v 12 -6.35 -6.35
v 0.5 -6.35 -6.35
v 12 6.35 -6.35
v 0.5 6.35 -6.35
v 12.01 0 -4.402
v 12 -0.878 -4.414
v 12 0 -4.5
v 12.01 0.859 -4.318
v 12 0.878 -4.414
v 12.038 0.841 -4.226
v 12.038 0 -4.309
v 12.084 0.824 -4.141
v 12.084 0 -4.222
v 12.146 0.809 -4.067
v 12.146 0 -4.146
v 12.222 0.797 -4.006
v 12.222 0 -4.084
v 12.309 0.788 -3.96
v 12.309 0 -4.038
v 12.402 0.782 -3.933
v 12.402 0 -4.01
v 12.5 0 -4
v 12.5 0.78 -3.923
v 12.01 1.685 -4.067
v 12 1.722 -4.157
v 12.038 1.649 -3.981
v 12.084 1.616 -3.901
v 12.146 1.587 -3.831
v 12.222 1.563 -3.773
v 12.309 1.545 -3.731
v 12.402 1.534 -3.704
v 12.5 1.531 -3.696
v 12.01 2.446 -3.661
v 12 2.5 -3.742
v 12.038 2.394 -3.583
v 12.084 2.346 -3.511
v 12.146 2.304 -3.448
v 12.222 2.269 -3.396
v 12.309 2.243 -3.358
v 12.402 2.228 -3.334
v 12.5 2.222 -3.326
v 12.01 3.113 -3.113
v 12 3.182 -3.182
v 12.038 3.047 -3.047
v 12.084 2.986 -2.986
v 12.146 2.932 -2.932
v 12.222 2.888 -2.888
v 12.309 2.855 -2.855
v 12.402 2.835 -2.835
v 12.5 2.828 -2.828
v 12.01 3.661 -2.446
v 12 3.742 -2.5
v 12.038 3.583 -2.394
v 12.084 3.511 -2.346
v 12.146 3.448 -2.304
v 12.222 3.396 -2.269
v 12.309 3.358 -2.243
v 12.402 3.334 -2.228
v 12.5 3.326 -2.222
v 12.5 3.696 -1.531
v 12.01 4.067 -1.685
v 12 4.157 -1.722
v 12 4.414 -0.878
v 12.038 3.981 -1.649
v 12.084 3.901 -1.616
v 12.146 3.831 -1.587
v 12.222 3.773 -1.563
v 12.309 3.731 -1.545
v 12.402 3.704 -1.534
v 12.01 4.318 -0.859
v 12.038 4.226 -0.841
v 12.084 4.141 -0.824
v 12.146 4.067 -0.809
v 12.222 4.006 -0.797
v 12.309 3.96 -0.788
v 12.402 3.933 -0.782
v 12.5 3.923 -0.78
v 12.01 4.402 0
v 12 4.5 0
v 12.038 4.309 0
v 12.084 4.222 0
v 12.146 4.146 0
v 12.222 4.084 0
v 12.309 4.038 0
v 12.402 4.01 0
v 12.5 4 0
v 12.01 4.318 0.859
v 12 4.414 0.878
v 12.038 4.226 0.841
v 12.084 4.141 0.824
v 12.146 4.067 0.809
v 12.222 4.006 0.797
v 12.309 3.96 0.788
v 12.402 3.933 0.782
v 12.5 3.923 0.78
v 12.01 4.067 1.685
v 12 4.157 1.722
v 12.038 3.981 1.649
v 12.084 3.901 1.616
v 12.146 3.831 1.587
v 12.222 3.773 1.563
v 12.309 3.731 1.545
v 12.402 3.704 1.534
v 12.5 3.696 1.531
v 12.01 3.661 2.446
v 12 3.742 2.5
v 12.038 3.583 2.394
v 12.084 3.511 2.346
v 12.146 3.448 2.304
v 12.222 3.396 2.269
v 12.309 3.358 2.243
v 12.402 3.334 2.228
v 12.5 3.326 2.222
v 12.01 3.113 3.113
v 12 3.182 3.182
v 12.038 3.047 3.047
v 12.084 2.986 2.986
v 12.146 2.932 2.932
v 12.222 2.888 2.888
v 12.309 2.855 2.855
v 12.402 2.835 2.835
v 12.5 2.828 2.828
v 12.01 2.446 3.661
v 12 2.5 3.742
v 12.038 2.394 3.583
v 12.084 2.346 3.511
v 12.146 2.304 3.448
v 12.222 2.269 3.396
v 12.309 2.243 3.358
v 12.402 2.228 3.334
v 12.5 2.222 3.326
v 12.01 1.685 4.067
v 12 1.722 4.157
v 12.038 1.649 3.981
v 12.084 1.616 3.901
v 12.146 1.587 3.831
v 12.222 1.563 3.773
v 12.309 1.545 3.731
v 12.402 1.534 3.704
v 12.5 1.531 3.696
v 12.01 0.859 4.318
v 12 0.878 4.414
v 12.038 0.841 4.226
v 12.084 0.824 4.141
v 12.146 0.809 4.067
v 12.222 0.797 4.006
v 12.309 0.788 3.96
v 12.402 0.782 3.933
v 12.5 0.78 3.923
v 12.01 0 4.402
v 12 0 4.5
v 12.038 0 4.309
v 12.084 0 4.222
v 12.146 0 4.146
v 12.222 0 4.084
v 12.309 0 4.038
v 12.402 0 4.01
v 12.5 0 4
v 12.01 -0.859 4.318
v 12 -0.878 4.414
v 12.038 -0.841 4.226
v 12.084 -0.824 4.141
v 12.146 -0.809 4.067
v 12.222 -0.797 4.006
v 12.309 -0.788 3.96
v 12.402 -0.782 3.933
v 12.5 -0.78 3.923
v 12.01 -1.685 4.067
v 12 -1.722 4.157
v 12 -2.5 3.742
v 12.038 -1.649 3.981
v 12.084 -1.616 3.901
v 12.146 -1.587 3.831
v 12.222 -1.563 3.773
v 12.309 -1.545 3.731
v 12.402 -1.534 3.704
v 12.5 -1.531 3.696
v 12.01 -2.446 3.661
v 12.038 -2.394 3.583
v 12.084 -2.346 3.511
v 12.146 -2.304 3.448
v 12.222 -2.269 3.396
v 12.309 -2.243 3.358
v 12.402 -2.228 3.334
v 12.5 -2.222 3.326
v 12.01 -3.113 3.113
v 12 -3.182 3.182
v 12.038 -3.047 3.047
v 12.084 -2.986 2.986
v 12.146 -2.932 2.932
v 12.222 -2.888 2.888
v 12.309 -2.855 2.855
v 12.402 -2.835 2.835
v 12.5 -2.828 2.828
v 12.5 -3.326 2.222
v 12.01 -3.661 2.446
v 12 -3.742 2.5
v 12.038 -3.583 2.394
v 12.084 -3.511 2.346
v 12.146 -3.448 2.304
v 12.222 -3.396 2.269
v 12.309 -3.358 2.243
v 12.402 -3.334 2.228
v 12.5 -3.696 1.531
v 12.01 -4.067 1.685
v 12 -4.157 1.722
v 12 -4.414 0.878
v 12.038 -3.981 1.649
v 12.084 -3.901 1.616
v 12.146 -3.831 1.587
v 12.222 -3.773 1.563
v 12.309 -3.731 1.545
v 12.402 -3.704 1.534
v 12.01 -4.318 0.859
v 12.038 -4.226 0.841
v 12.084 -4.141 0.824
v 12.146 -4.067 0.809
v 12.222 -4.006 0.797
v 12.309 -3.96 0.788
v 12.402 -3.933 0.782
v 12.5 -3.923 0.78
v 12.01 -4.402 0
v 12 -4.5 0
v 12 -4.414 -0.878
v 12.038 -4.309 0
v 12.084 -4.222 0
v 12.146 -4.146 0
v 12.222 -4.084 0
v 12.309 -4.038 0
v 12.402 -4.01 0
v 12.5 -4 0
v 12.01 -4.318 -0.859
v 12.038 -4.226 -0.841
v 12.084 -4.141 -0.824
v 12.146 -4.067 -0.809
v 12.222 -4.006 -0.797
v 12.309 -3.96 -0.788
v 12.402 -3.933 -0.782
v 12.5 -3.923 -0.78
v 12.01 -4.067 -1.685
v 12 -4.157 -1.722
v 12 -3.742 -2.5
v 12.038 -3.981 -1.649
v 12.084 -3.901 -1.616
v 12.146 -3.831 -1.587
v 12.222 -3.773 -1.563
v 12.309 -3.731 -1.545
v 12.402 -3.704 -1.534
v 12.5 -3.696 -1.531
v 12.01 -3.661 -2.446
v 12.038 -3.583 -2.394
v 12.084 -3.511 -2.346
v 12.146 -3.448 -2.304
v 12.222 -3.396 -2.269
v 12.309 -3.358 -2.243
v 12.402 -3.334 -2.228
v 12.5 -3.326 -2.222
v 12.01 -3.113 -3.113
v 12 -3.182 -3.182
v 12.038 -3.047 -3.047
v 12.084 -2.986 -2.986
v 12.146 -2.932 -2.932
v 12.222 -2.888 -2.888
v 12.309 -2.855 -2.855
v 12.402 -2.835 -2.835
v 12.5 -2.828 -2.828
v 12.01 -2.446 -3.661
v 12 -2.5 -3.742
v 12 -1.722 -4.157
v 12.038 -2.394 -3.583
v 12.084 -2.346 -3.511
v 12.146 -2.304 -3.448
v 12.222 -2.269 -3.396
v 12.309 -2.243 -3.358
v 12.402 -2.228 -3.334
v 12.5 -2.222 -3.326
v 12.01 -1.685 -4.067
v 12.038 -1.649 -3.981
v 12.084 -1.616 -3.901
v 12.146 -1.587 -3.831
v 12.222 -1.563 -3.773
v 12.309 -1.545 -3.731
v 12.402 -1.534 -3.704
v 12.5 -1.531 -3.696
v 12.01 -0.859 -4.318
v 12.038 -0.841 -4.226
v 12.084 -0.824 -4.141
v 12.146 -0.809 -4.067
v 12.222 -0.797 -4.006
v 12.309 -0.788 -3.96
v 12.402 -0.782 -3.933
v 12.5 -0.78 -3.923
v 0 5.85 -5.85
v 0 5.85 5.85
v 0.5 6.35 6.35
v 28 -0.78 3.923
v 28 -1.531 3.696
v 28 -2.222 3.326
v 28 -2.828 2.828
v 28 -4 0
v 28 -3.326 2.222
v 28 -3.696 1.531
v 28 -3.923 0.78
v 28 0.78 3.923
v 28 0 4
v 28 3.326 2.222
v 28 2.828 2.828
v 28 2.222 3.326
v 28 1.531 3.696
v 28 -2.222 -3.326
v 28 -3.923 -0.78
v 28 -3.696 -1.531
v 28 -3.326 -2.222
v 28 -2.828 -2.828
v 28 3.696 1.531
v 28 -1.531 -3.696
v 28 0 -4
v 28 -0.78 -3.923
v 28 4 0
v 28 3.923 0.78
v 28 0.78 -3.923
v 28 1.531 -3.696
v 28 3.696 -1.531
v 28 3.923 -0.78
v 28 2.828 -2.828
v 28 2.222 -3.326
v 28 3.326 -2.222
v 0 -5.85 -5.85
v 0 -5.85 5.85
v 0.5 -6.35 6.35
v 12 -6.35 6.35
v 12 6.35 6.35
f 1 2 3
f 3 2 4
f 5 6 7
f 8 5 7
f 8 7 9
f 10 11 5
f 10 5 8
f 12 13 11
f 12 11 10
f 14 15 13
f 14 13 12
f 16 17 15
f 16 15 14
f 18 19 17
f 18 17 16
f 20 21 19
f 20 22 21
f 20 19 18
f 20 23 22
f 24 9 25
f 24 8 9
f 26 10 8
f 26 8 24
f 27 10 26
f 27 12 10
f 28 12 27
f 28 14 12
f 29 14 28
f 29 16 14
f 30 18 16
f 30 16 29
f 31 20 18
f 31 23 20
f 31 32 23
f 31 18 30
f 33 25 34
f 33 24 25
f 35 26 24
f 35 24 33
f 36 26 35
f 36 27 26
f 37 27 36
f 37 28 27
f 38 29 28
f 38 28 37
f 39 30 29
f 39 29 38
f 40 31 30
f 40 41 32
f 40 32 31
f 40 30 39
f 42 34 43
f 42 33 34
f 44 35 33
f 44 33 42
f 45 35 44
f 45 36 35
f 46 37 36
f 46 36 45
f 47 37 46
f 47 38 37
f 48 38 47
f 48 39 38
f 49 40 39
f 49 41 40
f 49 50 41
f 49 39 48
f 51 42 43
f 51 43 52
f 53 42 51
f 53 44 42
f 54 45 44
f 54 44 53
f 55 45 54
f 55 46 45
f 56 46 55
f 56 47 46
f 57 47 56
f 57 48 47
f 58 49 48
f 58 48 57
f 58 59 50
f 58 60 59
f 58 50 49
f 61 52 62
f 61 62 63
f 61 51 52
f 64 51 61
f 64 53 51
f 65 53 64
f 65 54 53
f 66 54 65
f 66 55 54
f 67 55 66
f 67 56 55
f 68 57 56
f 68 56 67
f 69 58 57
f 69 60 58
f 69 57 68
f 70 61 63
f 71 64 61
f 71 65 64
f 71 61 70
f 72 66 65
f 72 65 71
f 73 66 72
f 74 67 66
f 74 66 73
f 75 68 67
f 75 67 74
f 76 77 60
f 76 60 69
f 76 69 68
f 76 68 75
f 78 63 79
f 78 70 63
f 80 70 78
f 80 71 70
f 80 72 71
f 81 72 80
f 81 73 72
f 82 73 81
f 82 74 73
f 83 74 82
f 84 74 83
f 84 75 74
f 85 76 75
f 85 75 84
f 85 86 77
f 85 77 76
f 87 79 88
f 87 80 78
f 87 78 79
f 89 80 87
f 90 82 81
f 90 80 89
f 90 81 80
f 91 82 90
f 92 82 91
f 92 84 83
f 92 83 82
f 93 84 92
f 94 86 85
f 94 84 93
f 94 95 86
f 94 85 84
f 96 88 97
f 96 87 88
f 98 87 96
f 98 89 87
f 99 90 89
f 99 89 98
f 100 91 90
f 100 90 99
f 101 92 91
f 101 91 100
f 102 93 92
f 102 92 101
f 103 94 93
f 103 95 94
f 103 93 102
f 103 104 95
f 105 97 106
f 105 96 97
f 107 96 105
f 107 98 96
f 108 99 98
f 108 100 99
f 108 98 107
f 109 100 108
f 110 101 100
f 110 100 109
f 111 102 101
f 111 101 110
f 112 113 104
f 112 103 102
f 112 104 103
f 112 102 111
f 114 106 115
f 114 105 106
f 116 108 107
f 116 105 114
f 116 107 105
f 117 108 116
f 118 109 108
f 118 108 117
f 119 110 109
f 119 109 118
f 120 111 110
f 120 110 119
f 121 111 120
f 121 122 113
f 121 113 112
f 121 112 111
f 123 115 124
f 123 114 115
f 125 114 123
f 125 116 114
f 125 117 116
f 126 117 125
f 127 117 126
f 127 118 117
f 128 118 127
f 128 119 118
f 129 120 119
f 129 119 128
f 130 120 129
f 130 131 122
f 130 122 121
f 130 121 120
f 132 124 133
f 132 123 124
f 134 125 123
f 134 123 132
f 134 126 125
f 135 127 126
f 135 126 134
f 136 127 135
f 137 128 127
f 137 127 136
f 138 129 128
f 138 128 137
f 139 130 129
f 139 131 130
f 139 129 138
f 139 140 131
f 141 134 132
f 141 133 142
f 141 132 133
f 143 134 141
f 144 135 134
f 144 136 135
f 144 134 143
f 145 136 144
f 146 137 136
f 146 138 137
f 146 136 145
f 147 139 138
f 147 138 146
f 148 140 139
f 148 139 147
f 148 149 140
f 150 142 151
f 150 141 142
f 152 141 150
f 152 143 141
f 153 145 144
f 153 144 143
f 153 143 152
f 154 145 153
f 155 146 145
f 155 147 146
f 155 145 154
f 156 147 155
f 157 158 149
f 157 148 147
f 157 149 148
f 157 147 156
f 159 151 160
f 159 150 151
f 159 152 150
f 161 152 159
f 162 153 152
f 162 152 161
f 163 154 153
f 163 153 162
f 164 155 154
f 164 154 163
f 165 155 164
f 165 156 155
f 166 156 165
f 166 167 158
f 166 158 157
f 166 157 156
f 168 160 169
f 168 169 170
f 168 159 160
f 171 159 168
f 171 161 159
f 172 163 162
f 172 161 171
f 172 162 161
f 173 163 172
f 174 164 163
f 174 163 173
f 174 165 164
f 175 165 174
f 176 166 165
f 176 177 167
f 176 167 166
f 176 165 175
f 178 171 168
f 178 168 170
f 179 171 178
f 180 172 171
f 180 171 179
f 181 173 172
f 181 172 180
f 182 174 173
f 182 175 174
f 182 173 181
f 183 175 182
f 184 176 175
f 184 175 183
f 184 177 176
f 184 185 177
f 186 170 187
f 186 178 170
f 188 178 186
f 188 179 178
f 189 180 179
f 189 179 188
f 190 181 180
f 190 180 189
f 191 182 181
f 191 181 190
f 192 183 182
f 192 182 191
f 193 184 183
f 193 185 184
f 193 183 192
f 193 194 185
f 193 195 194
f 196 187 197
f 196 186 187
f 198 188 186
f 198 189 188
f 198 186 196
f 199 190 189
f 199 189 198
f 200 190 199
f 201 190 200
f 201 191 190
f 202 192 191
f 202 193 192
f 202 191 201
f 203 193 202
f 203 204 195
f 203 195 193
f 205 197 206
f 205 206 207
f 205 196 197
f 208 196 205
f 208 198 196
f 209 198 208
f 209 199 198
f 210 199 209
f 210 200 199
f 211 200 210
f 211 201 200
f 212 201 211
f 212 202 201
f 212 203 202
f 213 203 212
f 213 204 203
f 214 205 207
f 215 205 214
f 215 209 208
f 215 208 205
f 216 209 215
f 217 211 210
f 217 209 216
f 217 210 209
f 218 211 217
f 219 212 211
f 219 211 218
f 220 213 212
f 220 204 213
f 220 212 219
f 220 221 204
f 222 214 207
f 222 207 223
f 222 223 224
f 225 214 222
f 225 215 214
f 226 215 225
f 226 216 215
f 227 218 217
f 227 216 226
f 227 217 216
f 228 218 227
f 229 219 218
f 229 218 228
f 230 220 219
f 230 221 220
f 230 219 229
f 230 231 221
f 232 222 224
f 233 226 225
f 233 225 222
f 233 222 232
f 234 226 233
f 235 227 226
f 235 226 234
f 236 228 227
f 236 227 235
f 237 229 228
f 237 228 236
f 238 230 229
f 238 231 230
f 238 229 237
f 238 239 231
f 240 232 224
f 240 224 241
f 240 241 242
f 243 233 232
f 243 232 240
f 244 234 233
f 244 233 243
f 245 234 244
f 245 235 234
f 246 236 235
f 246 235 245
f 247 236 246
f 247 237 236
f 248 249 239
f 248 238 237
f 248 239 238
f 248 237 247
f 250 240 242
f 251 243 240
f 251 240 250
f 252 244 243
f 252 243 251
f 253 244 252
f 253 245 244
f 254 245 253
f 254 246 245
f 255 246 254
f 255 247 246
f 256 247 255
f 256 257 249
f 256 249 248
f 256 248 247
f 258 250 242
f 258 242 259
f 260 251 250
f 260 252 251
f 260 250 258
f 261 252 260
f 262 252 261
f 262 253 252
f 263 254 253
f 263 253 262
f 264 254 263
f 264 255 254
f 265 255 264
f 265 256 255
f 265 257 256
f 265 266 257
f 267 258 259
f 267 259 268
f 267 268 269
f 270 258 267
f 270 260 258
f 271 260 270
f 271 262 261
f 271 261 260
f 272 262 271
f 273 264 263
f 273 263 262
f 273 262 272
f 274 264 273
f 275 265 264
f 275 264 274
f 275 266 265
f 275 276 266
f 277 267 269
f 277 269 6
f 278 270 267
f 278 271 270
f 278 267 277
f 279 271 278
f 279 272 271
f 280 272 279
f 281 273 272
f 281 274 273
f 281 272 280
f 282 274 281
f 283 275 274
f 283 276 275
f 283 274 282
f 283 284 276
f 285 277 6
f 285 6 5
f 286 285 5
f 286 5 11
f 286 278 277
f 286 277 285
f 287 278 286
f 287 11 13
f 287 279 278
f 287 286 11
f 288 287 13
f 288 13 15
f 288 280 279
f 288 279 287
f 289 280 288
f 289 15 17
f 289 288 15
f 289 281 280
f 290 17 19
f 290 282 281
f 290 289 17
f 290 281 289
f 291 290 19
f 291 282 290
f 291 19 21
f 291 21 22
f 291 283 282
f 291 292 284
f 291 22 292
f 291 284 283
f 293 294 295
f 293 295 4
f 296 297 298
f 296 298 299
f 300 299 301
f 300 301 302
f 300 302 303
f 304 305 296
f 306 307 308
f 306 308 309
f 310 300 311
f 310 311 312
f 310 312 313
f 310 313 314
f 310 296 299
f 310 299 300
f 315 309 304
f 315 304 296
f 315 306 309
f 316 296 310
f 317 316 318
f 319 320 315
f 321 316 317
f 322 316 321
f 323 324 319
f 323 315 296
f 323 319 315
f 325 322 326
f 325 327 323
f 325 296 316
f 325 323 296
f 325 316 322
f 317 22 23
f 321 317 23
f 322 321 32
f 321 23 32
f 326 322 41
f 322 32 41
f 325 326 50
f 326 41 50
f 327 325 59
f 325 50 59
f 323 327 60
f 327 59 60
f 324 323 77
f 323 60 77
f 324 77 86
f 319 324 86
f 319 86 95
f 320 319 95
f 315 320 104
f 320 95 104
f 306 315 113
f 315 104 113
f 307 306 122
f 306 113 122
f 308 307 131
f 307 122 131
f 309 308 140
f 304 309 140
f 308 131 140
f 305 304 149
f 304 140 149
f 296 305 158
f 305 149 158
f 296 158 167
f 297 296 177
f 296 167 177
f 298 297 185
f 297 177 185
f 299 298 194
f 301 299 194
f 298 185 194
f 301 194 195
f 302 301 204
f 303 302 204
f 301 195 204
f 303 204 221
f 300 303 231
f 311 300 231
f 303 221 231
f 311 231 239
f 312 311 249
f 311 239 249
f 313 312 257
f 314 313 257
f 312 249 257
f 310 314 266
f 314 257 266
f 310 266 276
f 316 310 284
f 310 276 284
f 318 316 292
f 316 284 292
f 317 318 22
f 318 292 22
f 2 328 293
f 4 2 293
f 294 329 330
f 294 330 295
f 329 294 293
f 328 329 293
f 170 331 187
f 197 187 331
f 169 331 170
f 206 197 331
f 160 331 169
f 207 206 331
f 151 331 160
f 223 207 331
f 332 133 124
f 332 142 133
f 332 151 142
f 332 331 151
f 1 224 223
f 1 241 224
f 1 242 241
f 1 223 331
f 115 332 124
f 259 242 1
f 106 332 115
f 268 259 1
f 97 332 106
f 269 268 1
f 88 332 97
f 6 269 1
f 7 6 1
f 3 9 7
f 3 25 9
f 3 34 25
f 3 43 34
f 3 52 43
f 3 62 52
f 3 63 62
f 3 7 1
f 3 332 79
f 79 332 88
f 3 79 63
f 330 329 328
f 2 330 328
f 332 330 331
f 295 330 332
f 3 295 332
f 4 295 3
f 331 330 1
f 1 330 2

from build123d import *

# Parameters (mm, degrees)
SKETCH1_W           = 12.7
SKETCH1_H           = 12.7
BOSS_EXTRUDE1_DEPTH = 12
SKETCH2_R           = 4
BOSS_EXTRUDE2_DEPTH = 16
FILLET1_R           = 0.5
CHAMFER2_SIZE       = 0.5


with BuildPart() as part:
    # Sketch1 → Boss-Extrude1 (new body)
    with BuildSketch(Plane(origin=(0, 0, 0), x_dir=(0, 0, -1), z_dir=(1, 0, 0))):
        Rectangle(SKETCH1_W, SKETCH1_H)
    extrude(amount=BOSS_EXTRUDE1_DEPTH)

    # Sketch2 → Boss-Extrude2 (add)
    with BuildSketch(Plane(origin=(12, 0, 0), x_dir=(0, 0, -1), z_dir=(1, 0, 0))):
        Circle(SKETCH2_R)
    extrude(amount=BOSS_EXTRUDE2_DEPTH)

    # Fillet1
    fillet1_edges = [part.edges().sort_by_distance(p)[0] for p in [
        (12, 0, 4),
    ]]
    fillet(fillet1_edges, radius=FILLET1_R)

    # Chamfer2
    chamfer2_edges = [part.edges().sort_by_distance(p)[0] for p in [
        (0, 6.35, 0),
        (0, 0, -6.35),
        (0, -6.35, 0),
        (0, 0, 6.35),
    ]]
    chamfer(chamfer2_edges, length=CHAMFER2_SIZE)


solid = part.part
